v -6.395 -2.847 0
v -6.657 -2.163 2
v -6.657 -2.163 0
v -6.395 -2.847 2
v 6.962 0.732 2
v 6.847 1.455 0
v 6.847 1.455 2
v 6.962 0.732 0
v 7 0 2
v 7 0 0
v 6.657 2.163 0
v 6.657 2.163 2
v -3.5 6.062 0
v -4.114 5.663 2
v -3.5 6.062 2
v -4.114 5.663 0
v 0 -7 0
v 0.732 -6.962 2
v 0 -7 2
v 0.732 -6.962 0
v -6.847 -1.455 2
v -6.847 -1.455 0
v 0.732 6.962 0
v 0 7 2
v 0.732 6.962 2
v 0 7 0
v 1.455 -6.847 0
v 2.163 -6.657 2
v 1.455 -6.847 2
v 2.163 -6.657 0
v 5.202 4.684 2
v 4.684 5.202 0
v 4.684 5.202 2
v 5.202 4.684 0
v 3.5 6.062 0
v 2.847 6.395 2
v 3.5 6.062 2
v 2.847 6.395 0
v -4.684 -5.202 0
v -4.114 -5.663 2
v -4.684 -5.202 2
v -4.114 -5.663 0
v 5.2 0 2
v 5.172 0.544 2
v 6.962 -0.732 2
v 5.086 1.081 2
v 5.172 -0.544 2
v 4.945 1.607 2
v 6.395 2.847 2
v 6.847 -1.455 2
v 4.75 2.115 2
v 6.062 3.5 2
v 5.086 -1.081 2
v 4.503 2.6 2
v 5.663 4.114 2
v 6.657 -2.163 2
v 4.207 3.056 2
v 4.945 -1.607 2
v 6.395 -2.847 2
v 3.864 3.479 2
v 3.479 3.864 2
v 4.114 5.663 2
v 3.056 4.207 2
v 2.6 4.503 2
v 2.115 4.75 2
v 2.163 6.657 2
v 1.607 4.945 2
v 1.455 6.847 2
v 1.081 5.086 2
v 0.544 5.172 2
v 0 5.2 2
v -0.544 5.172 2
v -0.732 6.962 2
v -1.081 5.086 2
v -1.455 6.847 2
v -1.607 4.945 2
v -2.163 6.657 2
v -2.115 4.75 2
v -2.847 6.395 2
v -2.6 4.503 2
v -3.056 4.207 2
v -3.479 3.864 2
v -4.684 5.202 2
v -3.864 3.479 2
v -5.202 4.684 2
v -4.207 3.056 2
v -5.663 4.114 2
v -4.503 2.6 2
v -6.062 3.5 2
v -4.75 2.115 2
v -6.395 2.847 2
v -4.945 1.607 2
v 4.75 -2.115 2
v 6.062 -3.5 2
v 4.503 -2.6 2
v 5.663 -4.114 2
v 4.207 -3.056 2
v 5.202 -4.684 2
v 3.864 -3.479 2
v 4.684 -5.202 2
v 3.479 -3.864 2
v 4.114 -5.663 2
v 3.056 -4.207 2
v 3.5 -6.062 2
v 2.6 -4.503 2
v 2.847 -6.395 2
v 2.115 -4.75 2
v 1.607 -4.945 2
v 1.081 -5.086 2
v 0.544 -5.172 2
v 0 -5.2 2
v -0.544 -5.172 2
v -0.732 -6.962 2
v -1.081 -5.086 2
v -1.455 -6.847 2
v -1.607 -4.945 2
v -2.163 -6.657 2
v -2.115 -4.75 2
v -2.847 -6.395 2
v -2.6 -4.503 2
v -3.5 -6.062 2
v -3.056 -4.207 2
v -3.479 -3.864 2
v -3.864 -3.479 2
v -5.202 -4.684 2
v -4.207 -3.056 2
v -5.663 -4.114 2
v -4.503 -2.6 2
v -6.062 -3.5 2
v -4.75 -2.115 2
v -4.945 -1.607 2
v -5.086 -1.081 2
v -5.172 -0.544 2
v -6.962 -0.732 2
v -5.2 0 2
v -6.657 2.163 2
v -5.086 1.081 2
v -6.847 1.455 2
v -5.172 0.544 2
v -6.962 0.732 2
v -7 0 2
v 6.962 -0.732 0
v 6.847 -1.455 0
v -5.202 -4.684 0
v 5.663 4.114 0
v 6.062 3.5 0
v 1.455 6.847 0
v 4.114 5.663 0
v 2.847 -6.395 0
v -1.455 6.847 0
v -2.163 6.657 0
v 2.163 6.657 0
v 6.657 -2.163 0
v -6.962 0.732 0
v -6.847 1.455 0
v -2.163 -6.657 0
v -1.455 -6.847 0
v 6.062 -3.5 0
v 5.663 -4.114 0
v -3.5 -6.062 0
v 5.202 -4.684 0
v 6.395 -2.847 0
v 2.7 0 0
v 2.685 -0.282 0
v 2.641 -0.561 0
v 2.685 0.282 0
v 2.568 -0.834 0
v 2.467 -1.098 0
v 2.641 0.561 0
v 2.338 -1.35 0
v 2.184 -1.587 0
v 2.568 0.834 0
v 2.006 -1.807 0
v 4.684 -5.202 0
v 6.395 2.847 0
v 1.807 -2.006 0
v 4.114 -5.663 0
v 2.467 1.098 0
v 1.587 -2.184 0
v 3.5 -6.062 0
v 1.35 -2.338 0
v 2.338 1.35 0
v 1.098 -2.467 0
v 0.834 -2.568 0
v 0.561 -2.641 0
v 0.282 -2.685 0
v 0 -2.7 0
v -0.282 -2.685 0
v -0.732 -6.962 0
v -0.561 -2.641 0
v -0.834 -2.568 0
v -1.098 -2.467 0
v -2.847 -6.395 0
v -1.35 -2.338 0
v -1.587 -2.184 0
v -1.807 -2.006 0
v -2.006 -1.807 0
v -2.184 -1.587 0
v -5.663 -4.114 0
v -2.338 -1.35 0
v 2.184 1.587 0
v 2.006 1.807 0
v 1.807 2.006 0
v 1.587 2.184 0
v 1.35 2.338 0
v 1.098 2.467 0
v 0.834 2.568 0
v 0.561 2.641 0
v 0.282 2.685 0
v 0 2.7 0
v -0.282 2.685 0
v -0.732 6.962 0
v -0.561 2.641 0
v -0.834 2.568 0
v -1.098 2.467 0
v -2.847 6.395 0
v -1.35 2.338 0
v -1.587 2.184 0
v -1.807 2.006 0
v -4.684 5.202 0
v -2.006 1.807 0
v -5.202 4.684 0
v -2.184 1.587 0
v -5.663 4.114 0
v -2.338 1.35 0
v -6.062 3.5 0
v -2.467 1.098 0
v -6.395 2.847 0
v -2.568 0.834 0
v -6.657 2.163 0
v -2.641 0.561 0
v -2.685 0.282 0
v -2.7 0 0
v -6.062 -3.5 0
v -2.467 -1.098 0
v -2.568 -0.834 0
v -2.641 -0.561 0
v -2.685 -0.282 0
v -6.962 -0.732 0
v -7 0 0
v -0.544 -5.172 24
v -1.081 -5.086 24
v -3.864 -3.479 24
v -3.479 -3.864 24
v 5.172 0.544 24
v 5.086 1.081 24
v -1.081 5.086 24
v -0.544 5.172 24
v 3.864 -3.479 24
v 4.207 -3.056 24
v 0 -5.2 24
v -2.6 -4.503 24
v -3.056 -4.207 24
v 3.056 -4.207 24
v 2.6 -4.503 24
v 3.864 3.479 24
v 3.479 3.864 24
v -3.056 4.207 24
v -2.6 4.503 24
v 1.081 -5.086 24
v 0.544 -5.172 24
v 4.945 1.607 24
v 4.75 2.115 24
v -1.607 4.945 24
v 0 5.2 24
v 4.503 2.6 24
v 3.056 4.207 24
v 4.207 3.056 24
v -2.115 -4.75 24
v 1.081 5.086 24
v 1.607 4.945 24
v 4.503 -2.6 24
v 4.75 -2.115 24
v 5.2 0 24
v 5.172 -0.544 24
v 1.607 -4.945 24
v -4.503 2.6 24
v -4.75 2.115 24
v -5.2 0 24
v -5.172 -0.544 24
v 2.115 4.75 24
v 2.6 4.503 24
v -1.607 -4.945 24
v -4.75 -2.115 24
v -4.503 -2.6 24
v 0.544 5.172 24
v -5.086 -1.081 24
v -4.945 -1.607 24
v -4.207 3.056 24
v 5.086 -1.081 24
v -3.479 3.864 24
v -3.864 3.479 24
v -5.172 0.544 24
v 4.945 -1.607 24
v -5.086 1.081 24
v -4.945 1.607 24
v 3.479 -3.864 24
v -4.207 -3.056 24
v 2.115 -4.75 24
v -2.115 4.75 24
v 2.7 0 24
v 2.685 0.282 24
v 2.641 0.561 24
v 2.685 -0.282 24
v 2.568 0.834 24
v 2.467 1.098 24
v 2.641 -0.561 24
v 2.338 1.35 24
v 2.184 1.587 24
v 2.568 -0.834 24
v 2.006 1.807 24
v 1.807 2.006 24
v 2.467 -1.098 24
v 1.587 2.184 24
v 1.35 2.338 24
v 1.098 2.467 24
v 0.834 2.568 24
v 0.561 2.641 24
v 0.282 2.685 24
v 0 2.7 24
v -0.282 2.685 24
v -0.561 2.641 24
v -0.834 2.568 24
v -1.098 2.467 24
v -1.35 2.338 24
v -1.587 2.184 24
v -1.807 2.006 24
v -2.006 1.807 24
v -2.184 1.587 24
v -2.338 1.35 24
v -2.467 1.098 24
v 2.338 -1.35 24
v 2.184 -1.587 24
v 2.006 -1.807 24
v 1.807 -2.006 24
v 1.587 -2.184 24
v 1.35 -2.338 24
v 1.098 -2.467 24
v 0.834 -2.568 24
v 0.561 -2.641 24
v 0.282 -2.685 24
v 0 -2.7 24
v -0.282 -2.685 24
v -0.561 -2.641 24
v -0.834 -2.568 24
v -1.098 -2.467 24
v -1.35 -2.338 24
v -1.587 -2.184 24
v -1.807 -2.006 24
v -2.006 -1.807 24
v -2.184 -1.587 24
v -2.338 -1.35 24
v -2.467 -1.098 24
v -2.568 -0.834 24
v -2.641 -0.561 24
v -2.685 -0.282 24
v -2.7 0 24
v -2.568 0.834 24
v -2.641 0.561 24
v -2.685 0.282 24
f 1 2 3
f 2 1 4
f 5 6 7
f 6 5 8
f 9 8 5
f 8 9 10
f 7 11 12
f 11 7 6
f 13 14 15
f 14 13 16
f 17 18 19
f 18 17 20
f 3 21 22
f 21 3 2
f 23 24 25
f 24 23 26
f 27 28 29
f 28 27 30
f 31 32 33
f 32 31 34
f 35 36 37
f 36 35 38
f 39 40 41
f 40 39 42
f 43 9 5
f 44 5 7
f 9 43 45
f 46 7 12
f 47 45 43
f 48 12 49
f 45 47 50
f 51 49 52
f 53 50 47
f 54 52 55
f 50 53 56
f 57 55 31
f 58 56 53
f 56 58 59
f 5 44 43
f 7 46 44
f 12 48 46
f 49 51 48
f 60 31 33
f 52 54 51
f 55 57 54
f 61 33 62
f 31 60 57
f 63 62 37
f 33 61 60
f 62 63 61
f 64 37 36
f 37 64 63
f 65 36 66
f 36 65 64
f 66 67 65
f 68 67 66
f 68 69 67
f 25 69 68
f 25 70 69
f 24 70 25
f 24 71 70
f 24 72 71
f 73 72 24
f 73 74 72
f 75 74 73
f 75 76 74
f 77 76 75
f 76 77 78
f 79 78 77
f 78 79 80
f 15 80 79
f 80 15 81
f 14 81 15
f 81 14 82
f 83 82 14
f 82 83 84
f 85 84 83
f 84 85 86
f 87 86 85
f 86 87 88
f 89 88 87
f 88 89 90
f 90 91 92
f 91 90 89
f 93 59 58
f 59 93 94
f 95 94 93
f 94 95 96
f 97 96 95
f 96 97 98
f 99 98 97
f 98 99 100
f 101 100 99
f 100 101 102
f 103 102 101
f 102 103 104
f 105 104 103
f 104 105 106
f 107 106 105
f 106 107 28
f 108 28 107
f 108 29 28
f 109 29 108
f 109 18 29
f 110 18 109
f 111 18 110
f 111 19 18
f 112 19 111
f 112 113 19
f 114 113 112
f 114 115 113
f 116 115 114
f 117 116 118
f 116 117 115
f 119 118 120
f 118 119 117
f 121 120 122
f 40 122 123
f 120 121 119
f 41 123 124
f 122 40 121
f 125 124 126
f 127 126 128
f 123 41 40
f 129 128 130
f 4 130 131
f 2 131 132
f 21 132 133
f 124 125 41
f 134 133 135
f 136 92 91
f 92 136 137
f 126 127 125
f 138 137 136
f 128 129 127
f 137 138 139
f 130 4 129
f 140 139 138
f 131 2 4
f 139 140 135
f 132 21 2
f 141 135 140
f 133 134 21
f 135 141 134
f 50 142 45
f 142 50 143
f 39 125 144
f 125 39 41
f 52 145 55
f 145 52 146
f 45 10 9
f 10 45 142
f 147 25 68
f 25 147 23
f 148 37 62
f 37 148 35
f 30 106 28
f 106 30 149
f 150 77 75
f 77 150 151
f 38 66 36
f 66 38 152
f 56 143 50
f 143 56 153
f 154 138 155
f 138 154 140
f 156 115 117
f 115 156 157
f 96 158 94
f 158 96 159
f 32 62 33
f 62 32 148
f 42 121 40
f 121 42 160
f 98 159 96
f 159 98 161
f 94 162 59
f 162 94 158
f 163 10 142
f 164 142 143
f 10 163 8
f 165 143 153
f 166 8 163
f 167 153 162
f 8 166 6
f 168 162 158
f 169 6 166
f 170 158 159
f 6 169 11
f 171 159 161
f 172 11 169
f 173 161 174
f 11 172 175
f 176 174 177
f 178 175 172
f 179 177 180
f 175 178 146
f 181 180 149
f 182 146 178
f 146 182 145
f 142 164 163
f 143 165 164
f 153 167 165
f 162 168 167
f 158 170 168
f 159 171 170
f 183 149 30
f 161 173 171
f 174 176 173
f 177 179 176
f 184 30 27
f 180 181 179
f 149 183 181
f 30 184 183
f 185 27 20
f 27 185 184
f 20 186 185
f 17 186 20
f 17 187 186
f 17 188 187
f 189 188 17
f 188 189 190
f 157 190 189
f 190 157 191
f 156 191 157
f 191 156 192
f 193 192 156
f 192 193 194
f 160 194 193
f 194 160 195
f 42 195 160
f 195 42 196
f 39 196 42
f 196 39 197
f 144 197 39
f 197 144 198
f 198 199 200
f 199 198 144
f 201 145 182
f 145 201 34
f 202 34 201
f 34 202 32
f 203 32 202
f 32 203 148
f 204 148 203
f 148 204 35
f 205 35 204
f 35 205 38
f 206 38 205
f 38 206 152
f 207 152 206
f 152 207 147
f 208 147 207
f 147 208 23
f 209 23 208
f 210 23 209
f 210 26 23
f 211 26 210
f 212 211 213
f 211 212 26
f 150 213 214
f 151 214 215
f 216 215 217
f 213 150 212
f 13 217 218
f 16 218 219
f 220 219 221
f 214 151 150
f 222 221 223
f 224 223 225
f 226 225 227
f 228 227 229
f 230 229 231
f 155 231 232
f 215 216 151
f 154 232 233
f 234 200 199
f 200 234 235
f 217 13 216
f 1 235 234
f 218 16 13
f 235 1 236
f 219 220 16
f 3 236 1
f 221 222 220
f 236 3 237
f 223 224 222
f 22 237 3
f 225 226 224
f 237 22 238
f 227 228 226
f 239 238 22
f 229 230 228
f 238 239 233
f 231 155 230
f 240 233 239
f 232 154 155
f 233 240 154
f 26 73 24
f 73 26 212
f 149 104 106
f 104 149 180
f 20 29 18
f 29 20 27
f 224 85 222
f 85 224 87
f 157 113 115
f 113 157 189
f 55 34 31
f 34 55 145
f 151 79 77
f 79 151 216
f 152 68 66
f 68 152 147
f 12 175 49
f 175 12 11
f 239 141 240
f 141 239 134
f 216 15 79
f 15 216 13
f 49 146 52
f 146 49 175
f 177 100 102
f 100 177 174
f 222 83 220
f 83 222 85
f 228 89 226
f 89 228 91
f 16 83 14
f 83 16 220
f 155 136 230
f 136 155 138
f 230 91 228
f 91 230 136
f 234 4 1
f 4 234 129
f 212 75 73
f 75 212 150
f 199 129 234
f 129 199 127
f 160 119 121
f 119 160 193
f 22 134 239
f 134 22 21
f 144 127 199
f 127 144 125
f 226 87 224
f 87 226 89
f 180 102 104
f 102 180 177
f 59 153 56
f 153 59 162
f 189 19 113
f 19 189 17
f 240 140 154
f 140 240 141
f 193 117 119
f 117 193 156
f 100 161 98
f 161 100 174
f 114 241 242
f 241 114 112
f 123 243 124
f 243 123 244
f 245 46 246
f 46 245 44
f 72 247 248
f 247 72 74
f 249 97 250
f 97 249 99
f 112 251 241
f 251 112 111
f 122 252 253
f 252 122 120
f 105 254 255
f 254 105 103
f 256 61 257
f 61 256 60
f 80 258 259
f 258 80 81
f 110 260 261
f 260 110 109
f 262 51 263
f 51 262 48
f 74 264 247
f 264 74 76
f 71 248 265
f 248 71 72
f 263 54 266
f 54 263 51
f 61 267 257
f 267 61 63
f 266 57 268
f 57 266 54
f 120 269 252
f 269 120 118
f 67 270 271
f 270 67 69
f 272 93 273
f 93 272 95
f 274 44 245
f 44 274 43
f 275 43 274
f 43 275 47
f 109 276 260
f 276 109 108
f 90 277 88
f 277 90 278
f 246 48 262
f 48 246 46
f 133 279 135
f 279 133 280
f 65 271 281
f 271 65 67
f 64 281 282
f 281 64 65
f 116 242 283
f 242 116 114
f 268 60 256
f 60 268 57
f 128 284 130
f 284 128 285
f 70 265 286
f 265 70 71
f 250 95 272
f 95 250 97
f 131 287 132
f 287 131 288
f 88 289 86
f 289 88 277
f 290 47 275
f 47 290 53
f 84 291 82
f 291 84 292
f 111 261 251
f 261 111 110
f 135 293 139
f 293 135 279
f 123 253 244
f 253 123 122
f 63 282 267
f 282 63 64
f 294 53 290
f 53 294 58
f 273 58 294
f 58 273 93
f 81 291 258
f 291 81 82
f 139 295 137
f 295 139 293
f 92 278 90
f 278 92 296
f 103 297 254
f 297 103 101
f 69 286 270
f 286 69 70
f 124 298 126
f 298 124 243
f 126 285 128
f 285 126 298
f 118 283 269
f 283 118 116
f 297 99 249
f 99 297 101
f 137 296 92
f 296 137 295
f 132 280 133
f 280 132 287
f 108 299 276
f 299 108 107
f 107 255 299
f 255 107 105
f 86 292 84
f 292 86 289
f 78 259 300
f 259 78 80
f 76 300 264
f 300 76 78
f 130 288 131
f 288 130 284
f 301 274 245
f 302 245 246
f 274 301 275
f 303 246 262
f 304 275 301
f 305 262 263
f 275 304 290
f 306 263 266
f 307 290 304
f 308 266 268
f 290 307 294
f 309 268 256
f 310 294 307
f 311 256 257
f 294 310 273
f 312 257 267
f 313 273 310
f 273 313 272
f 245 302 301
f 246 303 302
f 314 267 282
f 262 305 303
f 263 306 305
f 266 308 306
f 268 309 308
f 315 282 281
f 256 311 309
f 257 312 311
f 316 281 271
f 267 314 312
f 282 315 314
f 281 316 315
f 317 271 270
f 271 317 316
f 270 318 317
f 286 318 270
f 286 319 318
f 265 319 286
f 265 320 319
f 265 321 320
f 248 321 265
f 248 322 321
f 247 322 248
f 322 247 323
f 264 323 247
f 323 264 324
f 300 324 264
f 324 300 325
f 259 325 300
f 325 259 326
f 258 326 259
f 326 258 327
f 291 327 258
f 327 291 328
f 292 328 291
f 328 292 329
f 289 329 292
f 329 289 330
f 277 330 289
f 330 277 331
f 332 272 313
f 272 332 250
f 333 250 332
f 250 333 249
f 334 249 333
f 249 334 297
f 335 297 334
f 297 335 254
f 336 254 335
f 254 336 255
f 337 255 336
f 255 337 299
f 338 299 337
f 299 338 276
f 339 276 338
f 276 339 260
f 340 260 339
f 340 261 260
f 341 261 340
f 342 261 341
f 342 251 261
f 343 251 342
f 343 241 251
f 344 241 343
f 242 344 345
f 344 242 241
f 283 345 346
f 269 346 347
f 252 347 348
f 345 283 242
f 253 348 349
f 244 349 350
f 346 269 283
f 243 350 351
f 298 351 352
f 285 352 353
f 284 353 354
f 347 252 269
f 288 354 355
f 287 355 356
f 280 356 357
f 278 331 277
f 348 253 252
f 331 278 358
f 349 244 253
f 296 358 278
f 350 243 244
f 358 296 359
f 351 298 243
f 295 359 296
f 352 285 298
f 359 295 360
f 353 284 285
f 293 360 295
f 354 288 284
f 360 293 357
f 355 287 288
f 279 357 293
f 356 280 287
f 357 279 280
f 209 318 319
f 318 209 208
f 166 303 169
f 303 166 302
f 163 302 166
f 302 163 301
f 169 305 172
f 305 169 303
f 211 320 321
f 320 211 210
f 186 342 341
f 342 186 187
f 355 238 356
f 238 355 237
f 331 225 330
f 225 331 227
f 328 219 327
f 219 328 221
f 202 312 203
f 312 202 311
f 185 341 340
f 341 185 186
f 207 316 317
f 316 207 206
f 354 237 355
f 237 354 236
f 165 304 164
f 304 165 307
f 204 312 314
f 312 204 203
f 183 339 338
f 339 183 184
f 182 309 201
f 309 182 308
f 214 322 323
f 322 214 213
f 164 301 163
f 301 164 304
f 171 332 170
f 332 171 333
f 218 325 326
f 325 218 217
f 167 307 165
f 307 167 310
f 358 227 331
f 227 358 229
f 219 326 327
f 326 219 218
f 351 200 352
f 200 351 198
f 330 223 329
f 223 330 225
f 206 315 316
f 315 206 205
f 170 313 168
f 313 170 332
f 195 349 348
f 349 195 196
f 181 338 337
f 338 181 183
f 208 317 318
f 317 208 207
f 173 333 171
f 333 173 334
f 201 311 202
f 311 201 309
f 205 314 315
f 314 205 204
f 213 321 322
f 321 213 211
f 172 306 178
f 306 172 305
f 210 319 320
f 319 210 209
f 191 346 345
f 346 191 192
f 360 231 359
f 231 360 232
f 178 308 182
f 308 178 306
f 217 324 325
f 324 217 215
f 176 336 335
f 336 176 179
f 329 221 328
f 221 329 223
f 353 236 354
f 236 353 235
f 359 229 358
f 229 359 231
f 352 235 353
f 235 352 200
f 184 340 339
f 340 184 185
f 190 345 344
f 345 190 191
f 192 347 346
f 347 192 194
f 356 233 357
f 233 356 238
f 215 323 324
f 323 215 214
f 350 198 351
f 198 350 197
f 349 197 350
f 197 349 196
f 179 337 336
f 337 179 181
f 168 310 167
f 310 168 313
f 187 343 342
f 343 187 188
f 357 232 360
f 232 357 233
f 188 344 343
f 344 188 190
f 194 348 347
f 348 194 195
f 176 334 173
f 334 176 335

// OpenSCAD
// PCB standoff with mounting base.
$fn = 60;
eps = 0.02;
thread_d = 5.4;
base_d = 14;
height = 24;
body_d = thread_d+5;
difference() {
    union() { cylinder(d=base_d,h=2); cylinder(d=body_d,h=height); }
    translate([0,0,-eps]) cylinder(d=thread_d,h=height+2*eps);
}
